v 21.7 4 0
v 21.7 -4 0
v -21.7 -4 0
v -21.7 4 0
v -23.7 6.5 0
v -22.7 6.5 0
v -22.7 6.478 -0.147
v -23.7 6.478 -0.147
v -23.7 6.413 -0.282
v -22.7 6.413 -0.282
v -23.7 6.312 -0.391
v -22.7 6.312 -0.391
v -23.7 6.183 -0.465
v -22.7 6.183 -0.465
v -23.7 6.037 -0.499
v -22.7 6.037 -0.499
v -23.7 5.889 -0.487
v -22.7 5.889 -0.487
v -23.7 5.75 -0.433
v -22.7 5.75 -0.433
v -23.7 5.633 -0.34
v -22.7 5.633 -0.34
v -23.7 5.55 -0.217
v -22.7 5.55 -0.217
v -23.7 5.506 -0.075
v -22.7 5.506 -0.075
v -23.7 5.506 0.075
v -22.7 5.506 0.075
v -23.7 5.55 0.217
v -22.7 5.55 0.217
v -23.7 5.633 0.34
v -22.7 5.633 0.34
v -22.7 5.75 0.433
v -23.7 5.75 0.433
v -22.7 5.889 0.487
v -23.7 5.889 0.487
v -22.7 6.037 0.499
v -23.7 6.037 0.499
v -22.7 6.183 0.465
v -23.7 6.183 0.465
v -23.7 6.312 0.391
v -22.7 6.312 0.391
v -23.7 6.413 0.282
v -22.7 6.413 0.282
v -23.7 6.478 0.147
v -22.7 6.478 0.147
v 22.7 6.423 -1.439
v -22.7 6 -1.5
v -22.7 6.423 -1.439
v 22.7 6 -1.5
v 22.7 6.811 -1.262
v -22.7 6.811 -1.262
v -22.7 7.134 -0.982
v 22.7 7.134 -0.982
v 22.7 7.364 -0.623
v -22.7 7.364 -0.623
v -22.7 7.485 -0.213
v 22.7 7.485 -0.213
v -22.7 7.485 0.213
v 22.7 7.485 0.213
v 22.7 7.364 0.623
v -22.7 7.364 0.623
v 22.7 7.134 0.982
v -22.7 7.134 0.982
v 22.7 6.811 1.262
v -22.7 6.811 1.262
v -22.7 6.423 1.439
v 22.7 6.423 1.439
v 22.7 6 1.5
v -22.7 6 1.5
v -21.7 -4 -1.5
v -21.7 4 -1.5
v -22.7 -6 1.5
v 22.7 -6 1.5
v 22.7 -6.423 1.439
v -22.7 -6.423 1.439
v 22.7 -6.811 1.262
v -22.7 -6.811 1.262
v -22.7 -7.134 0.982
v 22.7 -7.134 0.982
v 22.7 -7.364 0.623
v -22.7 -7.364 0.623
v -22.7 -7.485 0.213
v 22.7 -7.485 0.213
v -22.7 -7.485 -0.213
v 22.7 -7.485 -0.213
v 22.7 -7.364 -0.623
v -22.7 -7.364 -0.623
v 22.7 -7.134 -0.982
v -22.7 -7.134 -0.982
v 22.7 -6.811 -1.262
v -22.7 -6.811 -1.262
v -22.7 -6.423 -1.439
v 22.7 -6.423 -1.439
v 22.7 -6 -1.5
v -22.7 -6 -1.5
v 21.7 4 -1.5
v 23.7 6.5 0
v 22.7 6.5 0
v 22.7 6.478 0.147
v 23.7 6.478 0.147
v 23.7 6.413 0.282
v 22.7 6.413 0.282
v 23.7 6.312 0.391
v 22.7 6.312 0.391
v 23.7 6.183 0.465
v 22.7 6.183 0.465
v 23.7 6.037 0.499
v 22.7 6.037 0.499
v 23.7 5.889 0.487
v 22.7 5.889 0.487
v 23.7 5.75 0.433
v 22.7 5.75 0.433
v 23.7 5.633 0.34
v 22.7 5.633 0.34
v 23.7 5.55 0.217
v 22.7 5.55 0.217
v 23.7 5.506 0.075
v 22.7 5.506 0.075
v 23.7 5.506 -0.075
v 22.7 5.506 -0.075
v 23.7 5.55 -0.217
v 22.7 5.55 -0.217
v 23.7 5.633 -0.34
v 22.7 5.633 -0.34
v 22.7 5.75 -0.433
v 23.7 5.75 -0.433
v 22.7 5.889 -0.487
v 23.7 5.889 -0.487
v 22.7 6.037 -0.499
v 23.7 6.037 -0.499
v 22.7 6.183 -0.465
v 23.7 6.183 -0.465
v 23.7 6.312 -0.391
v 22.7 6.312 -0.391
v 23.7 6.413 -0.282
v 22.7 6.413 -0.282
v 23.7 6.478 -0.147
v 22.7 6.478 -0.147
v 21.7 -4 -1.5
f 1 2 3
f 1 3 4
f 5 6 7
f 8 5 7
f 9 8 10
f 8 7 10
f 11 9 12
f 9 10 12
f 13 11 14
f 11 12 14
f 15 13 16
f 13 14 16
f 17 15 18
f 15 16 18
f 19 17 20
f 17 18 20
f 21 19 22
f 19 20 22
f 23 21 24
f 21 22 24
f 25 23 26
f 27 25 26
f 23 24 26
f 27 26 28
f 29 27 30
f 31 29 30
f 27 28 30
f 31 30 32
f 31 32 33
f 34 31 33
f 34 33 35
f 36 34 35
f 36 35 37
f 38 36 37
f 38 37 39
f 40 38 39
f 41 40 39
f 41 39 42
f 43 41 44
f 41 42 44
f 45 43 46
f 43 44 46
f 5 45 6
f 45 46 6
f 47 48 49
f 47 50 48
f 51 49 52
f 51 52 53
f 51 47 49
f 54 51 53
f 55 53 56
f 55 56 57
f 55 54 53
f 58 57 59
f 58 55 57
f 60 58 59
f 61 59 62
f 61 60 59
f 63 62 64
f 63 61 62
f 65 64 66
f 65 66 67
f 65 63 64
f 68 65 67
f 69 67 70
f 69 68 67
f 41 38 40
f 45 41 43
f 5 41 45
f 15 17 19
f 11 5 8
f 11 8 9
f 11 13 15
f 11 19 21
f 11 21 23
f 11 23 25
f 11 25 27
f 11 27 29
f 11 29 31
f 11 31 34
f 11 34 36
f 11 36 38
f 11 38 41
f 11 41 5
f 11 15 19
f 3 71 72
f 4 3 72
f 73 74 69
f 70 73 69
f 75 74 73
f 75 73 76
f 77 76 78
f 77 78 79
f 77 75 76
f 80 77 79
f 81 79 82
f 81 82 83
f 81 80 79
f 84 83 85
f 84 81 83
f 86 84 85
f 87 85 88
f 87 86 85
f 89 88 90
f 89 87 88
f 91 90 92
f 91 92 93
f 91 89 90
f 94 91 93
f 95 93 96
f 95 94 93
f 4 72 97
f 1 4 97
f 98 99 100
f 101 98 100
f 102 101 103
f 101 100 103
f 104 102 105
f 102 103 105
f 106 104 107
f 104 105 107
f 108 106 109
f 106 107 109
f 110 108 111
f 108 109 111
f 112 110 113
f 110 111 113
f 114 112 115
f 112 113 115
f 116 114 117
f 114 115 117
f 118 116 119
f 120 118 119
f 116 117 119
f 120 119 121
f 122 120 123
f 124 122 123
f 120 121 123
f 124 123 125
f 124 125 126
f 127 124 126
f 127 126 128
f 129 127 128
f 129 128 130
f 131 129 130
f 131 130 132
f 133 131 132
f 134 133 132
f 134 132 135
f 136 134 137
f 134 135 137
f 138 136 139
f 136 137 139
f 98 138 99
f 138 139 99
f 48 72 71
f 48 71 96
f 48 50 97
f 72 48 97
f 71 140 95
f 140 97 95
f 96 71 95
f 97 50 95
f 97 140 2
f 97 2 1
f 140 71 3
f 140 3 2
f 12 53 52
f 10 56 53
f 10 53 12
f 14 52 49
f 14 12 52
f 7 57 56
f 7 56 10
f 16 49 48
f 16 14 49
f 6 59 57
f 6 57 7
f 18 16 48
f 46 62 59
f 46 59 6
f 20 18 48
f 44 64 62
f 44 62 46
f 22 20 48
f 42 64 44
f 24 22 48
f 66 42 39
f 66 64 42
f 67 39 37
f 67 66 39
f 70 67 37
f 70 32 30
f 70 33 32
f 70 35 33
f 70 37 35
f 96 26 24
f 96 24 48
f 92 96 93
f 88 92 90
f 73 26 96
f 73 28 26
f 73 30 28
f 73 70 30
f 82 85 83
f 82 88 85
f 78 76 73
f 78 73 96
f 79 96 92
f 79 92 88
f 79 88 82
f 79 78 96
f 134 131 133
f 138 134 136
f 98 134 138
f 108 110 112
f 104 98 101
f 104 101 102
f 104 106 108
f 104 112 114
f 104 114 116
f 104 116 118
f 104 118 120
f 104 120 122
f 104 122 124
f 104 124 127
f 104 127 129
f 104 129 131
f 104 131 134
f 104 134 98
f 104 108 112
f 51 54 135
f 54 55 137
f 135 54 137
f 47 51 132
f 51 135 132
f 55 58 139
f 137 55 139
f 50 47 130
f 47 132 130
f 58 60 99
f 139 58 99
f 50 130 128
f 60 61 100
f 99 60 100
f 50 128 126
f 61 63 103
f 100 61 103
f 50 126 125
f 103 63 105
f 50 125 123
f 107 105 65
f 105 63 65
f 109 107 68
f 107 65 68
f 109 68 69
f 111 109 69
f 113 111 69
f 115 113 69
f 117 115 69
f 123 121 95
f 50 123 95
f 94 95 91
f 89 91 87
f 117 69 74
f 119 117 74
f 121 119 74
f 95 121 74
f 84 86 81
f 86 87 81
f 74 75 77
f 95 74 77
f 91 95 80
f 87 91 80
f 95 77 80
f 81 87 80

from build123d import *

# Parameters (mm, degrees)
PAD_DEPTH    = 22.7
SKETCH001_W  = 8
SKETCH001_H  = 43.4
POCKET_DEPTH = 1.5
SKETCH002_R  = 0.5
PAD001_DEPTH = 1
SKETCH003_R  = 0.5
PAD002_DEPTH = 1


with BuildPart() as part:
    # Sketch → Pad (new body, symmetric)
    with BuildSketch(Plane.YZ):
        with BuildLine():
            Line((-6, 1.5), (6, 1.5))
            ThreePointArc((6, -1.5), (7.5, 0), (6, 1.5))
            Line((6, -1.5), (-6, -1.5))
            ThreePointArc((-6, 1.5), (-7.5, 0), (-6, -1.5))
        make_face()
    extrude(amount=PAD_DEPTH, both=True)

    # Sketch001 (on Face1 of Pad) → Pocket (cut)
    with BuildSketch(Plane.YX.offset(1.5)):
        Rectangle(SKETCH001_W, SKETCH001_H)
    extrude(amount=-POCKET_DEPTH, mode=Mode.SUBTRACT)

    # Sketch002 (on Face4 of Pocket) → Pad001 (join)
    with BuildSketch(Plane.YZ.offset(22.7)):
        with Locations((6, 0)):
            Circle(SKETCH002_R)
    extrude(amount=PAD001_DEPTH)

    # Sketch003 (on Face3 of Pad001) → Pad002 (join)
    with BuildSketch(Plane(origin=(-22.7, 0, 0), x_dir=(0, 1, 0), z_dir=(-1, 0, 0))):
        with Locations((6, 0)):
            Circle(SKETCH003_R)
    extrude(amount=PAD002_DEPTH)


solid = part.part
